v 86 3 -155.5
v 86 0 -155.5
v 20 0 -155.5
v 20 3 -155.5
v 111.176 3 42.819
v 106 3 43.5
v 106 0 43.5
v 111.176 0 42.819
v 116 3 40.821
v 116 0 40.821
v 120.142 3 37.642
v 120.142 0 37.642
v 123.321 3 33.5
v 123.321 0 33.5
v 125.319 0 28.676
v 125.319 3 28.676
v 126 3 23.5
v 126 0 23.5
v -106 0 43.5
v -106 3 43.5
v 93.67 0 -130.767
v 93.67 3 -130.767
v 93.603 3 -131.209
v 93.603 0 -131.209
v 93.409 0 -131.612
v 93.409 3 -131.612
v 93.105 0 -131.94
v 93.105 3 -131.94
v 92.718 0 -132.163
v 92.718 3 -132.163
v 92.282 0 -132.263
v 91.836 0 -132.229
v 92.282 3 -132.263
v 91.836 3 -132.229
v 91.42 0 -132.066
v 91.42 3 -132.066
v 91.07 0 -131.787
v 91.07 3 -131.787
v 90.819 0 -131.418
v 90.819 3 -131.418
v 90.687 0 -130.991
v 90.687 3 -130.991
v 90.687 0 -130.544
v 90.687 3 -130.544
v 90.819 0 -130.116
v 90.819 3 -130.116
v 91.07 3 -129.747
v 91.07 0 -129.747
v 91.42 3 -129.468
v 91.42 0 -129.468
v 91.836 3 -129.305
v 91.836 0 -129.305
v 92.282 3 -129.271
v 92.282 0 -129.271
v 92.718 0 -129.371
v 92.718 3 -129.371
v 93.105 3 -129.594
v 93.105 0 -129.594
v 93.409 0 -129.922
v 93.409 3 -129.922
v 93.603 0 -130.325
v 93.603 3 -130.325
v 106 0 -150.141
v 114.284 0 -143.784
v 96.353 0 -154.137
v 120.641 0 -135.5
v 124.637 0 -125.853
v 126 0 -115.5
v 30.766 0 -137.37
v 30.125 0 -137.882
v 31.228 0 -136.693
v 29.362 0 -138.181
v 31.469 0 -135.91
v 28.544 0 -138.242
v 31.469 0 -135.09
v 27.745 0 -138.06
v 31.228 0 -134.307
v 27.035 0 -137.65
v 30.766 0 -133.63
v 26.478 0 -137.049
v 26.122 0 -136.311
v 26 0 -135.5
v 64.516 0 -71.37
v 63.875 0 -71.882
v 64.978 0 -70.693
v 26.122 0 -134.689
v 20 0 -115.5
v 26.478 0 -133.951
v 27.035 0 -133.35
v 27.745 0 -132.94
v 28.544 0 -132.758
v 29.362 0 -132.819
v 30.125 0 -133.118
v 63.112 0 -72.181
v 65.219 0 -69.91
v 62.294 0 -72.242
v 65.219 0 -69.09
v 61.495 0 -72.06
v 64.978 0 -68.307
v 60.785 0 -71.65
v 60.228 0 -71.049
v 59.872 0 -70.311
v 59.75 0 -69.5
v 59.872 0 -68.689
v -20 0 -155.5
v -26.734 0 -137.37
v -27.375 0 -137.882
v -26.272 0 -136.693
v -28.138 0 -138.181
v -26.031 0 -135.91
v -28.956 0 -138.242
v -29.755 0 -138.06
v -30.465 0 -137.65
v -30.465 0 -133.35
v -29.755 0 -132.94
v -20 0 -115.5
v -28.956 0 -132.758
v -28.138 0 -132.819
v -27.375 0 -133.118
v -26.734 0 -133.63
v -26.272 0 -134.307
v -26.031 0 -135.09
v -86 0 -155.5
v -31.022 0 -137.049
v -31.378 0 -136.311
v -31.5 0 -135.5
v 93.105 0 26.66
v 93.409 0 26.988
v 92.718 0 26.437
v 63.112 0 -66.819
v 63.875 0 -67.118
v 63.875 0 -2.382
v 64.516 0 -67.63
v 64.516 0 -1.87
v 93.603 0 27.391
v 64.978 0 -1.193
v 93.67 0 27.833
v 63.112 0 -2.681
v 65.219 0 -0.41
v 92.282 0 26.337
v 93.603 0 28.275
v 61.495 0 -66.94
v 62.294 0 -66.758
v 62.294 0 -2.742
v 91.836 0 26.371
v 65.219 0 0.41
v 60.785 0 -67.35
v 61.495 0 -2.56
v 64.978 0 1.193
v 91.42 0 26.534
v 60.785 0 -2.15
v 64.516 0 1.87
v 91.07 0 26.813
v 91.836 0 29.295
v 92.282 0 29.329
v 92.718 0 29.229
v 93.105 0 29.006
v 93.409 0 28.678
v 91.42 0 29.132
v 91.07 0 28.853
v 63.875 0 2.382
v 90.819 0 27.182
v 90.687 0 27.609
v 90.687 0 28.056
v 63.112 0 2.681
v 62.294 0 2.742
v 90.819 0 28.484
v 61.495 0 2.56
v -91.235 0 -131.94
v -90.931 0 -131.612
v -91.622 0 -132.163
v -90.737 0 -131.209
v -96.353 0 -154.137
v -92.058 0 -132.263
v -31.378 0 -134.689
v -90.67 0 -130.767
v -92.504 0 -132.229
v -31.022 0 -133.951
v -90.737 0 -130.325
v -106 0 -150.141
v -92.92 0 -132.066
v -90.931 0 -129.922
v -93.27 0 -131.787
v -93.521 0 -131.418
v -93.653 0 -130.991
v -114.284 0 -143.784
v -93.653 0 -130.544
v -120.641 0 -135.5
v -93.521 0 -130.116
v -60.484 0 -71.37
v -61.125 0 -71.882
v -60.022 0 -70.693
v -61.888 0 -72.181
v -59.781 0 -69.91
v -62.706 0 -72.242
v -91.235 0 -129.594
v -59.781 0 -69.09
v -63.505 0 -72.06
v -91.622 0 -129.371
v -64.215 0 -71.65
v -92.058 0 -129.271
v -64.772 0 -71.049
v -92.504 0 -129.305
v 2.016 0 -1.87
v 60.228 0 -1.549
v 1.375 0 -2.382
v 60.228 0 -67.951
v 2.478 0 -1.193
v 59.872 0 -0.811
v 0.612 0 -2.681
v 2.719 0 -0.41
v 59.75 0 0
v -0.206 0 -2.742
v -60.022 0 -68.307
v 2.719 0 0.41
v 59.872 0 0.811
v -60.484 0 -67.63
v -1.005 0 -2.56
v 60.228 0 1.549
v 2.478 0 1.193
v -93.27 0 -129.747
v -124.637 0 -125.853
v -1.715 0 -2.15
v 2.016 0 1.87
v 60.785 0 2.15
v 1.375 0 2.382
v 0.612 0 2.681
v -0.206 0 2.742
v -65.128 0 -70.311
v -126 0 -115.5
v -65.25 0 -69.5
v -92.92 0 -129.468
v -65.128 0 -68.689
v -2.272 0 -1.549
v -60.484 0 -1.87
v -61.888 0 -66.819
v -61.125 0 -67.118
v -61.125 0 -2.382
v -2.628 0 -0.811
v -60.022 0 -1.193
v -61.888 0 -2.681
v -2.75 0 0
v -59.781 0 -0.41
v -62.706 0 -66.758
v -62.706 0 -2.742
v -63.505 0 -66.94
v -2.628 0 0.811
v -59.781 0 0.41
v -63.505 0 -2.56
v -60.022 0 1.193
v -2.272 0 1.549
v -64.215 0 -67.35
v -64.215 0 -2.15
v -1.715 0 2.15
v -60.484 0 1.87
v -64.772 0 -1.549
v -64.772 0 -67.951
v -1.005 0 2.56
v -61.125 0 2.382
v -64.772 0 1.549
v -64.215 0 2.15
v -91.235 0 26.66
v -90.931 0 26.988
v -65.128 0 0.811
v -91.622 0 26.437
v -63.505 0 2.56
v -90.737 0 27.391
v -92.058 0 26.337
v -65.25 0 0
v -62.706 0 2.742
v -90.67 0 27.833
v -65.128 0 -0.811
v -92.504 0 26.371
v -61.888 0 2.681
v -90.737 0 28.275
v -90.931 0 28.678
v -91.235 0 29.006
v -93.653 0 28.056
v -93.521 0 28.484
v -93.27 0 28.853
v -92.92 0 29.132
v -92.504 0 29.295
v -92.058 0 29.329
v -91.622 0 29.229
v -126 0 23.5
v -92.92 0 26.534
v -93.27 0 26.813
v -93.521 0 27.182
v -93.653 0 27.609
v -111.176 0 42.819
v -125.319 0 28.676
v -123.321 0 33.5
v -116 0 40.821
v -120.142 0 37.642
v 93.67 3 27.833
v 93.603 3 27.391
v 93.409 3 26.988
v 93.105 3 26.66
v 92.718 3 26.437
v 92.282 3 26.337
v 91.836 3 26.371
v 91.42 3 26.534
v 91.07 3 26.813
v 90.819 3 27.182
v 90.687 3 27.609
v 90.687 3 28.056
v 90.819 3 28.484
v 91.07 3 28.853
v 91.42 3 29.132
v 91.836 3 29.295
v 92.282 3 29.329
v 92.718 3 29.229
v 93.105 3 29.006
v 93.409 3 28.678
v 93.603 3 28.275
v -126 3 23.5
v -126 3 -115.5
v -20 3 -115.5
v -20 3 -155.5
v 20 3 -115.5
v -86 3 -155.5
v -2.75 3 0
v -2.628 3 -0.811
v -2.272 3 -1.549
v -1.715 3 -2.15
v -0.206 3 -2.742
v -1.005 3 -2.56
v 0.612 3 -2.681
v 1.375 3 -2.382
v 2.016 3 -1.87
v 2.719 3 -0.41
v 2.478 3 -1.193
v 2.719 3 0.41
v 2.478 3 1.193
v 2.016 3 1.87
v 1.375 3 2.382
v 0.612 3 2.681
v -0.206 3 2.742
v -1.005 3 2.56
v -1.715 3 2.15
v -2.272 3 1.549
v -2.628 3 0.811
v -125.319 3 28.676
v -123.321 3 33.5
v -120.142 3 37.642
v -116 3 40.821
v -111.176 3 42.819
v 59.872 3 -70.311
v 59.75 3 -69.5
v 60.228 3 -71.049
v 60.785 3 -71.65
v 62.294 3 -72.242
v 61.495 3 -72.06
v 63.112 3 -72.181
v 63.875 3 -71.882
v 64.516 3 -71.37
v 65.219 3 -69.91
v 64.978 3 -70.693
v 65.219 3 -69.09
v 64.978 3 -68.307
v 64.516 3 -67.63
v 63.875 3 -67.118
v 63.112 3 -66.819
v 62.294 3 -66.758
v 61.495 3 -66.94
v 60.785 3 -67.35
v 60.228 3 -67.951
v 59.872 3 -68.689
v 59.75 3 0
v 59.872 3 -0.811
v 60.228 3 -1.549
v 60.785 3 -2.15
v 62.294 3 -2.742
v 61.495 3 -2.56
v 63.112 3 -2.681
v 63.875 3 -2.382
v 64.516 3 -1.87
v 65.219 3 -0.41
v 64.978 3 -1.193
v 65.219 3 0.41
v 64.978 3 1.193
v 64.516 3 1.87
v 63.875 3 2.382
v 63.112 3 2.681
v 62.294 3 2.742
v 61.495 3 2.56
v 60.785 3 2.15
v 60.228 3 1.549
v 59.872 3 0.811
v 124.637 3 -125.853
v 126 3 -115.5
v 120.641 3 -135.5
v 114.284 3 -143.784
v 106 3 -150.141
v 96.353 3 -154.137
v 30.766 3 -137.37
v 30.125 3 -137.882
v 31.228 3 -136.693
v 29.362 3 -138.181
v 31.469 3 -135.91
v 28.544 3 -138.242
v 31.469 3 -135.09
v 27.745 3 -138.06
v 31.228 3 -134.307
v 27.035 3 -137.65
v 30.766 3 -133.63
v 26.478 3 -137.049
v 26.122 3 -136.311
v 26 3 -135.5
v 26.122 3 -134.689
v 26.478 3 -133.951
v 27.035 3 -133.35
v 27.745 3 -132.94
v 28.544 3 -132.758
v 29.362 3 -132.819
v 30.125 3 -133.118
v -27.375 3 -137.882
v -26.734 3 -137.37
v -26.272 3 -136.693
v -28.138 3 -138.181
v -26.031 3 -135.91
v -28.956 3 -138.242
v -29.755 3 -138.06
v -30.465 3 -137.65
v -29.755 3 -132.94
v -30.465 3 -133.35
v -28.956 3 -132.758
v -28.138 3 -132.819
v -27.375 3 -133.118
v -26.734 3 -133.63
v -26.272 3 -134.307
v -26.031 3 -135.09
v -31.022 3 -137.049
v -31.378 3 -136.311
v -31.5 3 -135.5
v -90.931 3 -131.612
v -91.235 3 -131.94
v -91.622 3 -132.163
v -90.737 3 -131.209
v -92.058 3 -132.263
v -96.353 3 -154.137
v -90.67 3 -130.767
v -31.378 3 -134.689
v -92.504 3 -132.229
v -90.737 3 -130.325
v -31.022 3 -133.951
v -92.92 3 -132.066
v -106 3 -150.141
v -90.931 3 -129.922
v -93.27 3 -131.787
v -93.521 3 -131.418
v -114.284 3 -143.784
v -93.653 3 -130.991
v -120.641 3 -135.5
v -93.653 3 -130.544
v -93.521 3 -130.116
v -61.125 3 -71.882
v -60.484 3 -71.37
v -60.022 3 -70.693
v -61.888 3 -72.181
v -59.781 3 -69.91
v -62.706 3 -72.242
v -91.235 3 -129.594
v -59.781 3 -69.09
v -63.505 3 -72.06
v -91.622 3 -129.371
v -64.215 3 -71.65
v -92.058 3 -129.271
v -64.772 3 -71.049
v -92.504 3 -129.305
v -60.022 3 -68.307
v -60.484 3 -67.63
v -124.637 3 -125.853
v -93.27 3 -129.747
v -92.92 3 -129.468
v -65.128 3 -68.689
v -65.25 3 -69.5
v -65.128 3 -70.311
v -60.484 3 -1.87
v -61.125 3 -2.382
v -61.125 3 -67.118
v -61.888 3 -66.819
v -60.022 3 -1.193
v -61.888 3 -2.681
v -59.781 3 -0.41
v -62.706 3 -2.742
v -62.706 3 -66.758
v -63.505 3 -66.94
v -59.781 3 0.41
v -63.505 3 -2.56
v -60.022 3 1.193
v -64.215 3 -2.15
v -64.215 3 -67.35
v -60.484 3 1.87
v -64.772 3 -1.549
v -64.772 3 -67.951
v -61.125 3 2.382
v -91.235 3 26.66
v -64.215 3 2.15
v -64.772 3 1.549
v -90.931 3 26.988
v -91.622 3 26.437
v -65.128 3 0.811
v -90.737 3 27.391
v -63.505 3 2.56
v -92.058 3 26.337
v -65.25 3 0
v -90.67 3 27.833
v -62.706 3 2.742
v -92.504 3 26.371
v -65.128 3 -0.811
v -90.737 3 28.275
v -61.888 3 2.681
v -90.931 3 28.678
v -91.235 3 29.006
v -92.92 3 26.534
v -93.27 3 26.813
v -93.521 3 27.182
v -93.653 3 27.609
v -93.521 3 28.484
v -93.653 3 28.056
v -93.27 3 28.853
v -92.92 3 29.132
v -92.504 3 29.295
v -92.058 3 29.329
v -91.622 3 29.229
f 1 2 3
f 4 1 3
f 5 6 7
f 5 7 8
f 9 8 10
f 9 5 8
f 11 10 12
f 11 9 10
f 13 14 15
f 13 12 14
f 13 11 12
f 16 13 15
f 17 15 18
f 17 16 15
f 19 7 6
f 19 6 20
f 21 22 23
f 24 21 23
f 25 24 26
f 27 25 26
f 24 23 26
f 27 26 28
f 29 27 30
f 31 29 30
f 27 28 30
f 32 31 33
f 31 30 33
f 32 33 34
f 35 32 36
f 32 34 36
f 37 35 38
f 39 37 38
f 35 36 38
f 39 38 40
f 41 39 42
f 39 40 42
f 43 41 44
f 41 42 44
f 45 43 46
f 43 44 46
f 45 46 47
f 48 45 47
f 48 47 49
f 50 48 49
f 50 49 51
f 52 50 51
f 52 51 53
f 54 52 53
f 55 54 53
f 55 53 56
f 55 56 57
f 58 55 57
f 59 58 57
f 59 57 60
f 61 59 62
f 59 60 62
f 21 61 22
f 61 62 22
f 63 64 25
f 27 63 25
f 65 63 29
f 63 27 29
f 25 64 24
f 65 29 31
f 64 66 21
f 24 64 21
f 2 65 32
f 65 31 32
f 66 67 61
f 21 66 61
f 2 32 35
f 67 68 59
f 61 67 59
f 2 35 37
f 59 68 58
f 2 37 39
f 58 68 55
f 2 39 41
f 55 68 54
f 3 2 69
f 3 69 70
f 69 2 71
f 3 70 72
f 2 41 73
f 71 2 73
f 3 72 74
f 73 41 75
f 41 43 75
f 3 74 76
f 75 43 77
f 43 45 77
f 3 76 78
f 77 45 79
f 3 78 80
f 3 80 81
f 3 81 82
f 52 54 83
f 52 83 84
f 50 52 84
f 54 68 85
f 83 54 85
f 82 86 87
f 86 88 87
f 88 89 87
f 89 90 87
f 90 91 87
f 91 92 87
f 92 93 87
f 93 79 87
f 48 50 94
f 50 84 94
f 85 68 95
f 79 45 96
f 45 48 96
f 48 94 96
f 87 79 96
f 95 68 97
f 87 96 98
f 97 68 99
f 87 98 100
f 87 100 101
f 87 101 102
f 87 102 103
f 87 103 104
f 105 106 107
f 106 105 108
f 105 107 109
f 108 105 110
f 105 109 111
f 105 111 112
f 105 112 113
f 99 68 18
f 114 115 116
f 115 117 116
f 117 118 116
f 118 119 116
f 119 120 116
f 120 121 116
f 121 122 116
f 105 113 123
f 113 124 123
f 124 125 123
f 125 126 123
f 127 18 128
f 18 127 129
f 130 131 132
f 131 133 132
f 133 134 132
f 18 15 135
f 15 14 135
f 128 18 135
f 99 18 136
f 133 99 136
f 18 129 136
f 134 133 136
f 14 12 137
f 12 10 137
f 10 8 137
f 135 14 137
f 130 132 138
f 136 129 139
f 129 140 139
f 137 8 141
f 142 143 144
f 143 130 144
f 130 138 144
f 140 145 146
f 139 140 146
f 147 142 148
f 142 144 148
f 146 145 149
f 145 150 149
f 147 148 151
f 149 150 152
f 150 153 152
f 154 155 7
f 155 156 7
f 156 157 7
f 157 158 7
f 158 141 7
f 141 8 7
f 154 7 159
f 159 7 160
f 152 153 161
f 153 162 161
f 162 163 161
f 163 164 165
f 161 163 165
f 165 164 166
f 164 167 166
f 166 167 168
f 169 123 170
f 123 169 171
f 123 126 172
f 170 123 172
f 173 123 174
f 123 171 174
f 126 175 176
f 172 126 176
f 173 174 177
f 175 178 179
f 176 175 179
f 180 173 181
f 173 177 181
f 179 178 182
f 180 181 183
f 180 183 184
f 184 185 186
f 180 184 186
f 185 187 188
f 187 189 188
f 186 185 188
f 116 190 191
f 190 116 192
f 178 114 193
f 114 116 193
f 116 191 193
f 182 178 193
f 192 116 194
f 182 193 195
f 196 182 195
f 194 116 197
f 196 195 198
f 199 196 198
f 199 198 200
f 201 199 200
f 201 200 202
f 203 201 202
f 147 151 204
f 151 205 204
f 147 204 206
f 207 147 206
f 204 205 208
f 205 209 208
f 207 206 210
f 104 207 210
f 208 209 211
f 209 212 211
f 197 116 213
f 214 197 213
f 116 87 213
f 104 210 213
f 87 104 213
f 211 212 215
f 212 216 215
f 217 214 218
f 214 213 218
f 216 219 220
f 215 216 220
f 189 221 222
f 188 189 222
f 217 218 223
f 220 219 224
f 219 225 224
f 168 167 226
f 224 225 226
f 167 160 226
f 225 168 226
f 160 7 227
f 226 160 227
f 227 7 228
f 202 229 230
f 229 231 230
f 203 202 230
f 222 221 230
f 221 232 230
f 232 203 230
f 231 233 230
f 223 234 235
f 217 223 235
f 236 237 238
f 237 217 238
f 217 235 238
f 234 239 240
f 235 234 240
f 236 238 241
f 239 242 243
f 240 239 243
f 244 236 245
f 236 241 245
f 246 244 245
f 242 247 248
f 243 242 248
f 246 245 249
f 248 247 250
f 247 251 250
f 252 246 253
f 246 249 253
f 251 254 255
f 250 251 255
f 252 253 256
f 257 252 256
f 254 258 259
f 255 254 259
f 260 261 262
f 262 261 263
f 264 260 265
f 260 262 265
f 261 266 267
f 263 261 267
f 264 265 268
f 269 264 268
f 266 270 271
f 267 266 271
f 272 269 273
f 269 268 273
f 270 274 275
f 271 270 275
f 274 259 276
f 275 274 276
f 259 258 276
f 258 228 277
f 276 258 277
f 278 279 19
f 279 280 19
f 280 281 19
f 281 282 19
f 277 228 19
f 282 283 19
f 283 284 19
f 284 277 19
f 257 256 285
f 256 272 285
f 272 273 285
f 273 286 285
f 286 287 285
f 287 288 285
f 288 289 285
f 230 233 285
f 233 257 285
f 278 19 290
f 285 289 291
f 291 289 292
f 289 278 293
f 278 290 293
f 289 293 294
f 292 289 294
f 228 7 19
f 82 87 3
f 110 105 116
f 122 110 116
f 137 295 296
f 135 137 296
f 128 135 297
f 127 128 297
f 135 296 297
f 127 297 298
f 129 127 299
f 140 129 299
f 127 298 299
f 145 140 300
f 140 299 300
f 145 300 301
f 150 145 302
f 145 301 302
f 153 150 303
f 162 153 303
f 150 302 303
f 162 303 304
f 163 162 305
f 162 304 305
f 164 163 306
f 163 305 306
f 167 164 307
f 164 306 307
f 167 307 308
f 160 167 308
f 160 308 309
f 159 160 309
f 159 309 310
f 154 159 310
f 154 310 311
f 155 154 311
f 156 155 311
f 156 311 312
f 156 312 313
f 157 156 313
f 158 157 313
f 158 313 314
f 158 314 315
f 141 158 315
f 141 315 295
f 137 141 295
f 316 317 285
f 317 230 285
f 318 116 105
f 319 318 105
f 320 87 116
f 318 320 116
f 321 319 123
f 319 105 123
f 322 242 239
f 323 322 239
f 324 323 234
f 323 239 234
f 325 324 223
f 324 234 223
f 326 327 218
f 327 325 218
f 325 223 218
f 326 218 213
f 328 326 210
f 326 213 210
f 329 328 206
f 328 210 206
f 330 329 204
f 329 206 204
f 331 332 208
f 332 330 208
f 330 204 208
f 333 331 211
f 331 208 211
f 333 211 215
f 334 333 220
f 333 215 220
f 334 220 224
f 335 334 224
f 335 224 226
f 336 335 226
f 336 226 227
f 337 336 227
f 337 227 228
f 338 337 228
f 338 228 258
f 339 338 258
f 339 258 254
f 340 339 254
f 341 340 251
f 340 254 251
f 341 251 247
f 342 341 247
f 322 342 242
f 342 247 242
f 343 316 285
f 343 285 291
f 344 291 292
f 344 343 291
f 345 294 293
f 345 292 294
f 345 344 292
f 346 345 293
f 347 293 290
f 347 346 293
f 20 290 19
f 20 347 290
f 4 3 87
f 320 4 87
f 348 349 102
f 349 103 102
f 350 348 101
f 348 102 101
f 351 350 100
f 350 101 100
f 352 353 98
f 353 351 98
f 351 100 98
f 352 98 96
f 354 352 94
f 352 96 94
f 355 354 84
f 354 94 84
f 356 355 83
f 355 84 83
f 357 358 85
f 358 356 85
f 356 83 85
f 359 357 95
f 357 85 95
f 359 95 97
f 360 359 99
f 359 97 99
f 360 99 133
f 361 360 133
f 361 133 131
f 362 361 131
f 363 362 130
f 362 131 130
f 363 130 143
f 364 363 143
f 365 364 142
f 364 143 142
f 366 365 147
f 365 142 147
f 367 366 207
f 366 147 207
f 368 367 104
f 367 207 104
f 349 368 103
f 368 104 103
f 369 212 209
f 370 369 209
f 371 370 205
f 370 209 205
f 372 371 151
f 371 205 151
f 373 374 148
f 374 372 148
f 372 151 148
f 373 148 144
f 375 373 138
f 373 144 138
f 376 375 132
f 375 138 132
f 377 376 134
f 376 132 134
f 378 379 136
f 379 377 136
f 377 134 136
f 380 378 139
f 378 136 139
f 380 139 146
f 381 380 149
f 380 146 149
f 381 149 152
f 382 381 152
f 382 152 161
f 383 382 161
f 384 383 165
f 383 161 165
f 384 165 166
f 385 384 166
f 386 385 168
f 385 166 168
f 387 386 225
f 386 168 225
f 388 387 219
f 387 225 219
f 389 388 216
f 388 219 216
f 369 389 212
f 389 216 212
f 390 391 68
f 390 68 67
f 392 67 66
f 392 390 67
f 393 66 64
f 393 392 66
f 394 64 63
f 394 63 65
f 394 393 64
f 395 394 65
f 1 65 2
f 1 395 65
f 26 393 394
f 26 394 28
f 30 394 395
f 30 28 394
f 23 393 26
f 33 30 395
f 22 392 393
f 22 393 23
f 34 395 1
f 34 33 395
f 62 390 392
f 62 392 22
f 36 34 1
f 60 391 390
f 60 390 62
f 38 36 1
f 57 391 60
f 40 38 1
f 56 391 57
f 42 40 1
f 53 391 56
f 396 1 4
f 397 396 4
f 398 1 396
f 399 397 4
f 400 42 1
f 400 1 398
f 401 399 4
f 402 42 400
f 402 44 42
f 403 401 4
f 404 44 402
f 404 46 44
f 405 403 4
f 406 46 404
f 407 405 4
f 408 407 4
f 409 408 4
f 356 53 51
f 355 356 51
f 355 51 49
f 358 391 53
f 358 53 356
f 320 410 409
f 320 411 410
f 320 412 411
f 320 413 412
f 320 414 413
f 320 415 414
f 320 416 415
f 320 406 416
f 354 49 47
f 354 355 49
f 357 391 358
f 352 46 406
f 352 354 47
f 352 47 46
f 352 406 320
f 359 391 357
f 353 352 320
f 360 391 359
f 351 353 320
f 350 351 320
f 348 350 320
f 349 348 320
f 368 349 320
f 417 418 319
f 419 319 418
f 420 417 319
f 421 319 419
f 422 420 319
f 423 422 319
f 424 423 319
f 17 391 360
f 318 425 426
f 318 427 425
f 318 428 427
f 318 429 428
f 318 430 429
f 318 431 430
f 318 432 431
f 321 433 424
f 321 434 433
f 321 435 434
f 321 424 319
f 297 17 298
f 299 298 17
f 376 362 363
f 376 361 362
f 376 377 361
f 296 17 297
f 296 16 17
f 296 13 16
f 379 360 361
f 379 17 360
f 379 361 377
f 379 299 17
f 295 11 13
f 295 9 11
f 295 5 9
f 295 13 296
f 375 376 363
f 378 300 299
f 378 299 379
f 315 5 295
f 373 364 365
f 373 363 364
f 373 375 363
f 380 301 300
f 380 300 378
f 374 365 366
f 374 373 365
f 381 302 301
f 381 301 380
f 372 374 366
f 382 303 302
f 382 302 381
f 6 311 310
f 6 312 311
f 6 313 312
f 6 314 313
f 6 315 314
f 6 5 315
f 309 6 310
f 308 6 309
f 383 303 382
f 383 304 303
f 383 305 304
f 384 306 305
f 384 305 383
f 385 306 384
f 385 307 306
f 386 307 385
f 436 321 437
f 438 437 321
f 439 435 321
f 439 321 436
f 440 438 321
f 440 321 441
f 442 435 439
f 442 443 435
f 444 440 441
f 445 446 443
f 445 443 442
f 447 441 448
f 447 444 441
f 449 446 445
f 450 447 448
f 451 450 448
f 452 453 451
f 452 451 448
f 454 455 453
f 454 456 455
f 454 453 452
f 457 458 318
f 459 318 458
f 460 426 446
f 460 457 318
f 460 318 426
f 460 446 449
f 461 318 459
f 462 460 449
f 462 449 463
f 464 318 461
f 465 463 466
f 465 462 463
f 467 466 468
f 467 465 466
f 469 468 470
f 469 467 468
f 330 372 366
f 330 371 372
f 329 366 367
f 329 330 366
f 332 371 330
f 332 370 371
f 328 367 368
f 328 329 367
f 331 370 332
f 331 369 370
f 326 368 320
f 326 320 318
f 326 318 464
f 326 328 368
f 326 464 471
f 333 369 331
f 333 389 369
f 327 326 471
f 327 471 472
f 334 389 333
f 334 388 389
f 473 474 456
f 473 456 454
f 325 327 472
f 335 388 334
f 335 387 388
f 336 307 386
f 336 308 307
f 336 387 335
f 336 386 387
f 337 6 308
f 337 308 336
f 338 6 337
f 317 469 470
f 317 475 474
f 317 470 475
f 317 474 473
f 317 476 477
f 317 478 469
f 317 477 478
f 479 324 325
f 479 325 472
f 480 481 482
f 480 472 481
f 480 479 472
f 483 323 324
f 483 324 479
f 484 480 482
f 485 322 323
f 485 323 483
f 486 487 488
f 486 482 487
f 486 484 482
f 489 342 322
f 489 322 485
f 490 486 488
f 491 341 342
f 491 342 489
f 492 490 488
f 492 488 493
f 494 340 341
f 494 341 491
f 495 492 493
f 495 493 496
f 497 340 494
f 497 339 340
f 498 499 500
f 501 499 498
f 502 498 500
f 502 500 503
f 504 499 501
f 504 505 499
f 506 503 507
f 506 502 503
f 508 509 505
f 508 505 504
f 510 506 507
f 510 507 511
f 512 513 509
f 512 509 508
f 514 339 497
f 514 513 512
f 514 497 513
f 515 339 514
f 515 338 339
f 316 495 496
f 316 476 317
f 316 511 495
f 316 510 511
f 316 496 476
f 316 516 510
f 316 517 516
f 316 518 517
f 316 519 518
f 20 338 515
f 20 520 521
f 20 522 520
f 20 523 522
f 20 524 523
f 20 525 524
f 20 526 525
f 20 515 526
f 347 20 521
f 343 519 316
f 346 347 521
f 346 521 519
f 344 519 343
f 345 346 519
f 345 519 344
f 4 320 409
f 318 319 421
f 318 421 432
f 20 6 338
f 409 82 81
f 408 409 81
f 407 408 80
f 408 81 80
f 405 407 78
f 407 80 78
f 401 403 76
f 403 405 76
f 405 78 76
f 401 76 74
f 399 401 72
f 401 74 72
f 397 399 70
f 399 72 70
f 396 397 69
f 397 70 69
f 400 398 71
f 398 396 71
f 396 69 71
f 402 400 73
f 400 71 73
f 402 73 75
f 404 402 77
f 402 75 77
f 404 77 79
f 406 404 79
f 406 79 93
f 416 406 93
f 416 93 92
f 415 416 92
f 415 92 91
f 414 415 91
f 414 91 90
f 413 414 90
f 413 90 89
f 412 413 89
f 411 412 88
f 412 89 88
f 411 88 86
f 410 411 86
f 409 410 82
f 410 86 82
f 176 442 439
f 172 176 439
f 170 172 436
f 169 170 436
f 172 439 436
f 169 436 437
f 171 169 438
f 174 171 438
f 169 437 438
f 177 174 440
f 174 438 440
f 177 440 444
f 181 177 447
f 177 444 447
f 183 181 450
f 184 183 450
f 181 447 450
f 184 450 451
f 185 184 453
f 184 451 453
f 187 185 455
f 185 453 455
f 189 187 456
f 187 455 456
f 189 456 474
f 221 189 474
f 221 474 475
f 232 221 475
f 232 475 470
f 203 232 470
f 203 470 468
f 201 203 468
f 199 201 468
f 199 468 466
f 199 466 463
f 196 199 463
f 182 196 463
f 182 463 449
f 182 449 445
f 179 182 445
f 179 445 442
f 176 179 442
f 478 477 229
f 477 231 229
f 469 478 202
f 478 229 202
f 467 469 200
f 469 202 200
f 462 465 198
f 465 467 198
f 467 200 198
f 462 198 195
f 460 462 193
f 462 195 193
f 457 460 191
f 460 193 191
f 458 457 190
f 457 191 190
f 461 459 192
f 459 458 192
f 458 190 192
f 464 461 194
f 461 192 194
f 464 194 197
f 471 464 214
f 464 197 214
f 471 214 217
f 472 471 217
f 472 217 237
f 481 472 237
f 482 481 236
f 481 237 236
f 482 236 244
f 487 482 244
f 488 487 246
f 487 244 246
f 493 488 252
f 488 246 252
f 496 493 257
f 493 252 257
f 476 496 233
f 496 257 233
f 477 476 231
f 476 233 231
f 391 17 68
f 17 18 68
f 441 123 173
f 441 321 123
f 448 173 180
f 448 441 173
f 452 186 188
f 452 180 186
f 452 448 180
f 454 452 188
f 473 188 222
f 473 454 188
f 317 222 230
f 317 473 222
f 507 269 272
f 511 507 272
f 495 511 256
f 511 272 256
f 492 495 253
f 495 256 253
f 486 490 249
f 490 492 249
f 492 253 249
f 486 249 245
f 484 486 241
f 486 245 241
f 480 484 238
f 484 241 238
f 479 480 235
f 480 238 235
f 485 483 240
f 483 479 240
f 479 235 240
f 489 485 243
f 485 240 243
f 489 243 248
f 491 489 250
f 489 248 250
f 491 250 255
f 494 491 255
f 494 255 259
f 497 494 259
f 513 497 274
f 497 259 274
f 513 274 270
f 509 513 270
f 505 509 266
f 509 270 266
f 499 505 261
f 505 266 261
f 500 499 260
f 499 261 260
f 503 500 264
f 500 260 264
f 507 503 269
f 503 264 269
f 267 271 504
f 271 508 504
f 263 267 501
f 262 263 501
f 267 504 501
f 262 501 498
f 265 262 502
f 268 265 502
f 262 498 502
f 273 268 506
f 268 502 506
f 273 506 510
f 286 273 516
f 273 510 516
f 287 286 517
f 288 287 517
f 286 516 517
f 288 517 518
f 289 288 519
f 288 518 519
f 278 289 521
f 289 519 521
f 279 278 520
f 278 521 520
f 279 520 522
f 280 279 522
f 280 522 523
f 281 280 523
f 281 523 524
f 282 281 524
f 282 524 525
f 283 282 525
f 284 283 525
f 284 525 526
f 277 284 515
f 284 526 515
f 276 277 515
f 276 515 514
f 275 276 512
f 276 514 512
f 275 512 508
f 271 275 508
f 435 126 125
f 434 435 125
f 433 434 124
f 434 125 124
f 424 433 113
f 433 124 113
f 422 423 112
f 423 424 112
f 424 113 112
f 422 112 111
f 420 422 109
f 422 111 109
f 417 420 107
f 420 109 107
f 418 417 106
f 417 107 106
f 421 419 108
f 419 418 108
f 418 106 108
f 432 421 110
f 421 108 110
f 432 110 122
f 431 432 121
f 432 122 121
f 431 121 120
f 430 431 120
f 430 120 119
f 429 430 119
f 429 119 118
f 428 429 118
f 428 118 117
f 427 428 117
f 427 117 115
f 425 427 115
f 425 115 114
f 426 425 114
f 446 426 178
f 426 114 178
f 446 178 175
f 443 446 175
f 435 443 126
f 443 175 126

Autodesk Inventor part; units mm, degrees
ref_plane "YZ Plane" through (0, 0, 0) normal (1, 0, 0) x (0, 1, 0)
ref_plane "XZ Plane" through (0, 0, 0) normal (0, 1, 0) x (-1, 0, 0)
ref_plane "XY Plane" through (0, 0, 0) normal (0, 0, 1) x (1, 0, 0)
sketch "Sketch1" plane through (0, 0, 0) normal (0, 1, 0) x (-1, 0, 0)
  line L0 (126, -23.5) -> (126, 23.5)
  line L1 (126, 23.5) -> (-126, 23.5)
  line L2 (-126, 23.5) -> (-126, -23.5)
  line L3 (82.5, -115.5) -> (82.5, -33.5)
  line L4 (0, 23.5) -> (0, -23.5) construction
  line L5 (-82.5, -115.5) -> (-82.5, -33.5)
  line L6 (42.5, -155.5) -> (-42.5, -155.5)
  line L7 (-126, -23.5) -> (-92.5, -23.5)
  line L8 (92.5, -23.5) -> (126, -23.5)
  arc A0 (-82.5, -33.5) -> (-92.5, -23.5) centre (-92.5, -33.5) ccw
  arc A1 (92.5, -23.5) -> (82.5, -33.5) centre (92.5, -33.5) ccw
  line L9 (0, 23.5) -> (0, -155.5) construction
  line L10 (20, -155.5) -> (-20, -155.5)
  line L11 (-20, -155.5) -> (-20, -115.5)
  line L12 (-20, -115.5) -> (20, -115.5)
  line L13 (20, -115.5) -> (20, -155.5)
  circle A2 centre (0, 0) radius 2.75
  circle A3 centre (62.5, 0) radius 2.75
  circle A4 centre (-62.5, 0) radius 2.75
  circle A5 centre (62.5, -69.5) radius 2.75
  circle A6 centre (-62.5, -69.5) radius 2.75
  circle A7 centre (28.75, -135.5) radius 2.75
  circle A8 centre (-28.75, -135.5) radius 2.75
  line L14 (82.5, -115.5) -> (82.5, -155.5)
  line L15 (82.5, -155.5) -> (42.5, -155.5)
  line L16 (-42.5, -155.5) -> (-82.5, -155.5)
  line L17 (-82.5, -155.5) -> (-82.5, -115.5)
  line L18 (126, -23.5) -> (-126, -23.5)
  line L19 (-126, -23.5) -> (-126, -155.5)
  line L20 (-126, -155.5) -> (126, -155.5)
  line L21 (126, -155.5) -> (126, -23.5)
  line L22 (126, 23.5) -> (-126, 23.5)
  line L23 (-126, 23.5) -> (-126, 43.5)
  line L24 (-126, 43.5) -> (126, 43.5)
  line L25 (126, 43.5) -> (126, 23.5)
  point P0 (82.5, -23.5)
  point P1 (-82.5, -23.5)
  point P2 (0, -135.5)
  dimension "d0" = 252
  dimension "d1" = 47
  dimension "d4" = 10
  dimension "d5" = 40
  dimension "d6" = 40
  dimension "d7" = 5.5
  dimension "d8" = 5.5
  dimension "d9" = 5.5
  dimension "d10" = 5.5
  dimension "d16" = 20
extrude "Extrusion1" add sketch "Sketch1" along normal blind 3 contours L8 L18 L7 L2 L1 L0 | L21 L20 L14 L3 A1 L8 | L1 L23 L24 L25 | A1 L3 L14 L15 L6 L13 L12 L11 L16 L17 L5 A0 L18 | A0 L5 L17 L20 L19 L7
fillet "Fillet3" radius 40 2 edges at (126, 1.5, -155.5) (-126, 1.5, -155.5)
fillet "Fillet4" radius 20 2 edges at (126, 1.5, 43.5) (-126, 1.5, 43.5)
sketch "Sketch2" plane through (0, 3, 0) normal (0, 1, 0) x (1, 0, 0)
  line L0 (-92.17, 130.7671) -> (92.17, 130.7671) construction
  line L1 (92.17, 130.7671) -> (92.17, -27.8329) construction
  line L2 (92.17, -27.8329) -> (-92.17, -27.8329) construction
  line L3 (-92.17, -27.8329) -> (-92.17, 130.7671) construction
  line L4 (0, 150.8633) -> (0, -88.711) construction
  line L5 (20, 115.5) -> (-20, 115.5) projected
  circle A0 centre (-92.17, 130.7671) radius 1.5
  circle A1 centre (92.17, 130.7671) radius 1.5
  circle A2 centre (-92.17, -27.8329) radius 1.5
  circle A3 centre (92.17, -27.8329) radius 1.5
  point P0 (0, 0)
  point P1 (0, 115.5)
  dimension "d18" = 184.34
  dimension "d19" = 158.6
  dimension "d20" = 3
extrude "Extrusion2" cut sketch "Sketch2" against normal through all
equation "\"d21\" = d19"
properties part number "Chassis Rear Plate"
